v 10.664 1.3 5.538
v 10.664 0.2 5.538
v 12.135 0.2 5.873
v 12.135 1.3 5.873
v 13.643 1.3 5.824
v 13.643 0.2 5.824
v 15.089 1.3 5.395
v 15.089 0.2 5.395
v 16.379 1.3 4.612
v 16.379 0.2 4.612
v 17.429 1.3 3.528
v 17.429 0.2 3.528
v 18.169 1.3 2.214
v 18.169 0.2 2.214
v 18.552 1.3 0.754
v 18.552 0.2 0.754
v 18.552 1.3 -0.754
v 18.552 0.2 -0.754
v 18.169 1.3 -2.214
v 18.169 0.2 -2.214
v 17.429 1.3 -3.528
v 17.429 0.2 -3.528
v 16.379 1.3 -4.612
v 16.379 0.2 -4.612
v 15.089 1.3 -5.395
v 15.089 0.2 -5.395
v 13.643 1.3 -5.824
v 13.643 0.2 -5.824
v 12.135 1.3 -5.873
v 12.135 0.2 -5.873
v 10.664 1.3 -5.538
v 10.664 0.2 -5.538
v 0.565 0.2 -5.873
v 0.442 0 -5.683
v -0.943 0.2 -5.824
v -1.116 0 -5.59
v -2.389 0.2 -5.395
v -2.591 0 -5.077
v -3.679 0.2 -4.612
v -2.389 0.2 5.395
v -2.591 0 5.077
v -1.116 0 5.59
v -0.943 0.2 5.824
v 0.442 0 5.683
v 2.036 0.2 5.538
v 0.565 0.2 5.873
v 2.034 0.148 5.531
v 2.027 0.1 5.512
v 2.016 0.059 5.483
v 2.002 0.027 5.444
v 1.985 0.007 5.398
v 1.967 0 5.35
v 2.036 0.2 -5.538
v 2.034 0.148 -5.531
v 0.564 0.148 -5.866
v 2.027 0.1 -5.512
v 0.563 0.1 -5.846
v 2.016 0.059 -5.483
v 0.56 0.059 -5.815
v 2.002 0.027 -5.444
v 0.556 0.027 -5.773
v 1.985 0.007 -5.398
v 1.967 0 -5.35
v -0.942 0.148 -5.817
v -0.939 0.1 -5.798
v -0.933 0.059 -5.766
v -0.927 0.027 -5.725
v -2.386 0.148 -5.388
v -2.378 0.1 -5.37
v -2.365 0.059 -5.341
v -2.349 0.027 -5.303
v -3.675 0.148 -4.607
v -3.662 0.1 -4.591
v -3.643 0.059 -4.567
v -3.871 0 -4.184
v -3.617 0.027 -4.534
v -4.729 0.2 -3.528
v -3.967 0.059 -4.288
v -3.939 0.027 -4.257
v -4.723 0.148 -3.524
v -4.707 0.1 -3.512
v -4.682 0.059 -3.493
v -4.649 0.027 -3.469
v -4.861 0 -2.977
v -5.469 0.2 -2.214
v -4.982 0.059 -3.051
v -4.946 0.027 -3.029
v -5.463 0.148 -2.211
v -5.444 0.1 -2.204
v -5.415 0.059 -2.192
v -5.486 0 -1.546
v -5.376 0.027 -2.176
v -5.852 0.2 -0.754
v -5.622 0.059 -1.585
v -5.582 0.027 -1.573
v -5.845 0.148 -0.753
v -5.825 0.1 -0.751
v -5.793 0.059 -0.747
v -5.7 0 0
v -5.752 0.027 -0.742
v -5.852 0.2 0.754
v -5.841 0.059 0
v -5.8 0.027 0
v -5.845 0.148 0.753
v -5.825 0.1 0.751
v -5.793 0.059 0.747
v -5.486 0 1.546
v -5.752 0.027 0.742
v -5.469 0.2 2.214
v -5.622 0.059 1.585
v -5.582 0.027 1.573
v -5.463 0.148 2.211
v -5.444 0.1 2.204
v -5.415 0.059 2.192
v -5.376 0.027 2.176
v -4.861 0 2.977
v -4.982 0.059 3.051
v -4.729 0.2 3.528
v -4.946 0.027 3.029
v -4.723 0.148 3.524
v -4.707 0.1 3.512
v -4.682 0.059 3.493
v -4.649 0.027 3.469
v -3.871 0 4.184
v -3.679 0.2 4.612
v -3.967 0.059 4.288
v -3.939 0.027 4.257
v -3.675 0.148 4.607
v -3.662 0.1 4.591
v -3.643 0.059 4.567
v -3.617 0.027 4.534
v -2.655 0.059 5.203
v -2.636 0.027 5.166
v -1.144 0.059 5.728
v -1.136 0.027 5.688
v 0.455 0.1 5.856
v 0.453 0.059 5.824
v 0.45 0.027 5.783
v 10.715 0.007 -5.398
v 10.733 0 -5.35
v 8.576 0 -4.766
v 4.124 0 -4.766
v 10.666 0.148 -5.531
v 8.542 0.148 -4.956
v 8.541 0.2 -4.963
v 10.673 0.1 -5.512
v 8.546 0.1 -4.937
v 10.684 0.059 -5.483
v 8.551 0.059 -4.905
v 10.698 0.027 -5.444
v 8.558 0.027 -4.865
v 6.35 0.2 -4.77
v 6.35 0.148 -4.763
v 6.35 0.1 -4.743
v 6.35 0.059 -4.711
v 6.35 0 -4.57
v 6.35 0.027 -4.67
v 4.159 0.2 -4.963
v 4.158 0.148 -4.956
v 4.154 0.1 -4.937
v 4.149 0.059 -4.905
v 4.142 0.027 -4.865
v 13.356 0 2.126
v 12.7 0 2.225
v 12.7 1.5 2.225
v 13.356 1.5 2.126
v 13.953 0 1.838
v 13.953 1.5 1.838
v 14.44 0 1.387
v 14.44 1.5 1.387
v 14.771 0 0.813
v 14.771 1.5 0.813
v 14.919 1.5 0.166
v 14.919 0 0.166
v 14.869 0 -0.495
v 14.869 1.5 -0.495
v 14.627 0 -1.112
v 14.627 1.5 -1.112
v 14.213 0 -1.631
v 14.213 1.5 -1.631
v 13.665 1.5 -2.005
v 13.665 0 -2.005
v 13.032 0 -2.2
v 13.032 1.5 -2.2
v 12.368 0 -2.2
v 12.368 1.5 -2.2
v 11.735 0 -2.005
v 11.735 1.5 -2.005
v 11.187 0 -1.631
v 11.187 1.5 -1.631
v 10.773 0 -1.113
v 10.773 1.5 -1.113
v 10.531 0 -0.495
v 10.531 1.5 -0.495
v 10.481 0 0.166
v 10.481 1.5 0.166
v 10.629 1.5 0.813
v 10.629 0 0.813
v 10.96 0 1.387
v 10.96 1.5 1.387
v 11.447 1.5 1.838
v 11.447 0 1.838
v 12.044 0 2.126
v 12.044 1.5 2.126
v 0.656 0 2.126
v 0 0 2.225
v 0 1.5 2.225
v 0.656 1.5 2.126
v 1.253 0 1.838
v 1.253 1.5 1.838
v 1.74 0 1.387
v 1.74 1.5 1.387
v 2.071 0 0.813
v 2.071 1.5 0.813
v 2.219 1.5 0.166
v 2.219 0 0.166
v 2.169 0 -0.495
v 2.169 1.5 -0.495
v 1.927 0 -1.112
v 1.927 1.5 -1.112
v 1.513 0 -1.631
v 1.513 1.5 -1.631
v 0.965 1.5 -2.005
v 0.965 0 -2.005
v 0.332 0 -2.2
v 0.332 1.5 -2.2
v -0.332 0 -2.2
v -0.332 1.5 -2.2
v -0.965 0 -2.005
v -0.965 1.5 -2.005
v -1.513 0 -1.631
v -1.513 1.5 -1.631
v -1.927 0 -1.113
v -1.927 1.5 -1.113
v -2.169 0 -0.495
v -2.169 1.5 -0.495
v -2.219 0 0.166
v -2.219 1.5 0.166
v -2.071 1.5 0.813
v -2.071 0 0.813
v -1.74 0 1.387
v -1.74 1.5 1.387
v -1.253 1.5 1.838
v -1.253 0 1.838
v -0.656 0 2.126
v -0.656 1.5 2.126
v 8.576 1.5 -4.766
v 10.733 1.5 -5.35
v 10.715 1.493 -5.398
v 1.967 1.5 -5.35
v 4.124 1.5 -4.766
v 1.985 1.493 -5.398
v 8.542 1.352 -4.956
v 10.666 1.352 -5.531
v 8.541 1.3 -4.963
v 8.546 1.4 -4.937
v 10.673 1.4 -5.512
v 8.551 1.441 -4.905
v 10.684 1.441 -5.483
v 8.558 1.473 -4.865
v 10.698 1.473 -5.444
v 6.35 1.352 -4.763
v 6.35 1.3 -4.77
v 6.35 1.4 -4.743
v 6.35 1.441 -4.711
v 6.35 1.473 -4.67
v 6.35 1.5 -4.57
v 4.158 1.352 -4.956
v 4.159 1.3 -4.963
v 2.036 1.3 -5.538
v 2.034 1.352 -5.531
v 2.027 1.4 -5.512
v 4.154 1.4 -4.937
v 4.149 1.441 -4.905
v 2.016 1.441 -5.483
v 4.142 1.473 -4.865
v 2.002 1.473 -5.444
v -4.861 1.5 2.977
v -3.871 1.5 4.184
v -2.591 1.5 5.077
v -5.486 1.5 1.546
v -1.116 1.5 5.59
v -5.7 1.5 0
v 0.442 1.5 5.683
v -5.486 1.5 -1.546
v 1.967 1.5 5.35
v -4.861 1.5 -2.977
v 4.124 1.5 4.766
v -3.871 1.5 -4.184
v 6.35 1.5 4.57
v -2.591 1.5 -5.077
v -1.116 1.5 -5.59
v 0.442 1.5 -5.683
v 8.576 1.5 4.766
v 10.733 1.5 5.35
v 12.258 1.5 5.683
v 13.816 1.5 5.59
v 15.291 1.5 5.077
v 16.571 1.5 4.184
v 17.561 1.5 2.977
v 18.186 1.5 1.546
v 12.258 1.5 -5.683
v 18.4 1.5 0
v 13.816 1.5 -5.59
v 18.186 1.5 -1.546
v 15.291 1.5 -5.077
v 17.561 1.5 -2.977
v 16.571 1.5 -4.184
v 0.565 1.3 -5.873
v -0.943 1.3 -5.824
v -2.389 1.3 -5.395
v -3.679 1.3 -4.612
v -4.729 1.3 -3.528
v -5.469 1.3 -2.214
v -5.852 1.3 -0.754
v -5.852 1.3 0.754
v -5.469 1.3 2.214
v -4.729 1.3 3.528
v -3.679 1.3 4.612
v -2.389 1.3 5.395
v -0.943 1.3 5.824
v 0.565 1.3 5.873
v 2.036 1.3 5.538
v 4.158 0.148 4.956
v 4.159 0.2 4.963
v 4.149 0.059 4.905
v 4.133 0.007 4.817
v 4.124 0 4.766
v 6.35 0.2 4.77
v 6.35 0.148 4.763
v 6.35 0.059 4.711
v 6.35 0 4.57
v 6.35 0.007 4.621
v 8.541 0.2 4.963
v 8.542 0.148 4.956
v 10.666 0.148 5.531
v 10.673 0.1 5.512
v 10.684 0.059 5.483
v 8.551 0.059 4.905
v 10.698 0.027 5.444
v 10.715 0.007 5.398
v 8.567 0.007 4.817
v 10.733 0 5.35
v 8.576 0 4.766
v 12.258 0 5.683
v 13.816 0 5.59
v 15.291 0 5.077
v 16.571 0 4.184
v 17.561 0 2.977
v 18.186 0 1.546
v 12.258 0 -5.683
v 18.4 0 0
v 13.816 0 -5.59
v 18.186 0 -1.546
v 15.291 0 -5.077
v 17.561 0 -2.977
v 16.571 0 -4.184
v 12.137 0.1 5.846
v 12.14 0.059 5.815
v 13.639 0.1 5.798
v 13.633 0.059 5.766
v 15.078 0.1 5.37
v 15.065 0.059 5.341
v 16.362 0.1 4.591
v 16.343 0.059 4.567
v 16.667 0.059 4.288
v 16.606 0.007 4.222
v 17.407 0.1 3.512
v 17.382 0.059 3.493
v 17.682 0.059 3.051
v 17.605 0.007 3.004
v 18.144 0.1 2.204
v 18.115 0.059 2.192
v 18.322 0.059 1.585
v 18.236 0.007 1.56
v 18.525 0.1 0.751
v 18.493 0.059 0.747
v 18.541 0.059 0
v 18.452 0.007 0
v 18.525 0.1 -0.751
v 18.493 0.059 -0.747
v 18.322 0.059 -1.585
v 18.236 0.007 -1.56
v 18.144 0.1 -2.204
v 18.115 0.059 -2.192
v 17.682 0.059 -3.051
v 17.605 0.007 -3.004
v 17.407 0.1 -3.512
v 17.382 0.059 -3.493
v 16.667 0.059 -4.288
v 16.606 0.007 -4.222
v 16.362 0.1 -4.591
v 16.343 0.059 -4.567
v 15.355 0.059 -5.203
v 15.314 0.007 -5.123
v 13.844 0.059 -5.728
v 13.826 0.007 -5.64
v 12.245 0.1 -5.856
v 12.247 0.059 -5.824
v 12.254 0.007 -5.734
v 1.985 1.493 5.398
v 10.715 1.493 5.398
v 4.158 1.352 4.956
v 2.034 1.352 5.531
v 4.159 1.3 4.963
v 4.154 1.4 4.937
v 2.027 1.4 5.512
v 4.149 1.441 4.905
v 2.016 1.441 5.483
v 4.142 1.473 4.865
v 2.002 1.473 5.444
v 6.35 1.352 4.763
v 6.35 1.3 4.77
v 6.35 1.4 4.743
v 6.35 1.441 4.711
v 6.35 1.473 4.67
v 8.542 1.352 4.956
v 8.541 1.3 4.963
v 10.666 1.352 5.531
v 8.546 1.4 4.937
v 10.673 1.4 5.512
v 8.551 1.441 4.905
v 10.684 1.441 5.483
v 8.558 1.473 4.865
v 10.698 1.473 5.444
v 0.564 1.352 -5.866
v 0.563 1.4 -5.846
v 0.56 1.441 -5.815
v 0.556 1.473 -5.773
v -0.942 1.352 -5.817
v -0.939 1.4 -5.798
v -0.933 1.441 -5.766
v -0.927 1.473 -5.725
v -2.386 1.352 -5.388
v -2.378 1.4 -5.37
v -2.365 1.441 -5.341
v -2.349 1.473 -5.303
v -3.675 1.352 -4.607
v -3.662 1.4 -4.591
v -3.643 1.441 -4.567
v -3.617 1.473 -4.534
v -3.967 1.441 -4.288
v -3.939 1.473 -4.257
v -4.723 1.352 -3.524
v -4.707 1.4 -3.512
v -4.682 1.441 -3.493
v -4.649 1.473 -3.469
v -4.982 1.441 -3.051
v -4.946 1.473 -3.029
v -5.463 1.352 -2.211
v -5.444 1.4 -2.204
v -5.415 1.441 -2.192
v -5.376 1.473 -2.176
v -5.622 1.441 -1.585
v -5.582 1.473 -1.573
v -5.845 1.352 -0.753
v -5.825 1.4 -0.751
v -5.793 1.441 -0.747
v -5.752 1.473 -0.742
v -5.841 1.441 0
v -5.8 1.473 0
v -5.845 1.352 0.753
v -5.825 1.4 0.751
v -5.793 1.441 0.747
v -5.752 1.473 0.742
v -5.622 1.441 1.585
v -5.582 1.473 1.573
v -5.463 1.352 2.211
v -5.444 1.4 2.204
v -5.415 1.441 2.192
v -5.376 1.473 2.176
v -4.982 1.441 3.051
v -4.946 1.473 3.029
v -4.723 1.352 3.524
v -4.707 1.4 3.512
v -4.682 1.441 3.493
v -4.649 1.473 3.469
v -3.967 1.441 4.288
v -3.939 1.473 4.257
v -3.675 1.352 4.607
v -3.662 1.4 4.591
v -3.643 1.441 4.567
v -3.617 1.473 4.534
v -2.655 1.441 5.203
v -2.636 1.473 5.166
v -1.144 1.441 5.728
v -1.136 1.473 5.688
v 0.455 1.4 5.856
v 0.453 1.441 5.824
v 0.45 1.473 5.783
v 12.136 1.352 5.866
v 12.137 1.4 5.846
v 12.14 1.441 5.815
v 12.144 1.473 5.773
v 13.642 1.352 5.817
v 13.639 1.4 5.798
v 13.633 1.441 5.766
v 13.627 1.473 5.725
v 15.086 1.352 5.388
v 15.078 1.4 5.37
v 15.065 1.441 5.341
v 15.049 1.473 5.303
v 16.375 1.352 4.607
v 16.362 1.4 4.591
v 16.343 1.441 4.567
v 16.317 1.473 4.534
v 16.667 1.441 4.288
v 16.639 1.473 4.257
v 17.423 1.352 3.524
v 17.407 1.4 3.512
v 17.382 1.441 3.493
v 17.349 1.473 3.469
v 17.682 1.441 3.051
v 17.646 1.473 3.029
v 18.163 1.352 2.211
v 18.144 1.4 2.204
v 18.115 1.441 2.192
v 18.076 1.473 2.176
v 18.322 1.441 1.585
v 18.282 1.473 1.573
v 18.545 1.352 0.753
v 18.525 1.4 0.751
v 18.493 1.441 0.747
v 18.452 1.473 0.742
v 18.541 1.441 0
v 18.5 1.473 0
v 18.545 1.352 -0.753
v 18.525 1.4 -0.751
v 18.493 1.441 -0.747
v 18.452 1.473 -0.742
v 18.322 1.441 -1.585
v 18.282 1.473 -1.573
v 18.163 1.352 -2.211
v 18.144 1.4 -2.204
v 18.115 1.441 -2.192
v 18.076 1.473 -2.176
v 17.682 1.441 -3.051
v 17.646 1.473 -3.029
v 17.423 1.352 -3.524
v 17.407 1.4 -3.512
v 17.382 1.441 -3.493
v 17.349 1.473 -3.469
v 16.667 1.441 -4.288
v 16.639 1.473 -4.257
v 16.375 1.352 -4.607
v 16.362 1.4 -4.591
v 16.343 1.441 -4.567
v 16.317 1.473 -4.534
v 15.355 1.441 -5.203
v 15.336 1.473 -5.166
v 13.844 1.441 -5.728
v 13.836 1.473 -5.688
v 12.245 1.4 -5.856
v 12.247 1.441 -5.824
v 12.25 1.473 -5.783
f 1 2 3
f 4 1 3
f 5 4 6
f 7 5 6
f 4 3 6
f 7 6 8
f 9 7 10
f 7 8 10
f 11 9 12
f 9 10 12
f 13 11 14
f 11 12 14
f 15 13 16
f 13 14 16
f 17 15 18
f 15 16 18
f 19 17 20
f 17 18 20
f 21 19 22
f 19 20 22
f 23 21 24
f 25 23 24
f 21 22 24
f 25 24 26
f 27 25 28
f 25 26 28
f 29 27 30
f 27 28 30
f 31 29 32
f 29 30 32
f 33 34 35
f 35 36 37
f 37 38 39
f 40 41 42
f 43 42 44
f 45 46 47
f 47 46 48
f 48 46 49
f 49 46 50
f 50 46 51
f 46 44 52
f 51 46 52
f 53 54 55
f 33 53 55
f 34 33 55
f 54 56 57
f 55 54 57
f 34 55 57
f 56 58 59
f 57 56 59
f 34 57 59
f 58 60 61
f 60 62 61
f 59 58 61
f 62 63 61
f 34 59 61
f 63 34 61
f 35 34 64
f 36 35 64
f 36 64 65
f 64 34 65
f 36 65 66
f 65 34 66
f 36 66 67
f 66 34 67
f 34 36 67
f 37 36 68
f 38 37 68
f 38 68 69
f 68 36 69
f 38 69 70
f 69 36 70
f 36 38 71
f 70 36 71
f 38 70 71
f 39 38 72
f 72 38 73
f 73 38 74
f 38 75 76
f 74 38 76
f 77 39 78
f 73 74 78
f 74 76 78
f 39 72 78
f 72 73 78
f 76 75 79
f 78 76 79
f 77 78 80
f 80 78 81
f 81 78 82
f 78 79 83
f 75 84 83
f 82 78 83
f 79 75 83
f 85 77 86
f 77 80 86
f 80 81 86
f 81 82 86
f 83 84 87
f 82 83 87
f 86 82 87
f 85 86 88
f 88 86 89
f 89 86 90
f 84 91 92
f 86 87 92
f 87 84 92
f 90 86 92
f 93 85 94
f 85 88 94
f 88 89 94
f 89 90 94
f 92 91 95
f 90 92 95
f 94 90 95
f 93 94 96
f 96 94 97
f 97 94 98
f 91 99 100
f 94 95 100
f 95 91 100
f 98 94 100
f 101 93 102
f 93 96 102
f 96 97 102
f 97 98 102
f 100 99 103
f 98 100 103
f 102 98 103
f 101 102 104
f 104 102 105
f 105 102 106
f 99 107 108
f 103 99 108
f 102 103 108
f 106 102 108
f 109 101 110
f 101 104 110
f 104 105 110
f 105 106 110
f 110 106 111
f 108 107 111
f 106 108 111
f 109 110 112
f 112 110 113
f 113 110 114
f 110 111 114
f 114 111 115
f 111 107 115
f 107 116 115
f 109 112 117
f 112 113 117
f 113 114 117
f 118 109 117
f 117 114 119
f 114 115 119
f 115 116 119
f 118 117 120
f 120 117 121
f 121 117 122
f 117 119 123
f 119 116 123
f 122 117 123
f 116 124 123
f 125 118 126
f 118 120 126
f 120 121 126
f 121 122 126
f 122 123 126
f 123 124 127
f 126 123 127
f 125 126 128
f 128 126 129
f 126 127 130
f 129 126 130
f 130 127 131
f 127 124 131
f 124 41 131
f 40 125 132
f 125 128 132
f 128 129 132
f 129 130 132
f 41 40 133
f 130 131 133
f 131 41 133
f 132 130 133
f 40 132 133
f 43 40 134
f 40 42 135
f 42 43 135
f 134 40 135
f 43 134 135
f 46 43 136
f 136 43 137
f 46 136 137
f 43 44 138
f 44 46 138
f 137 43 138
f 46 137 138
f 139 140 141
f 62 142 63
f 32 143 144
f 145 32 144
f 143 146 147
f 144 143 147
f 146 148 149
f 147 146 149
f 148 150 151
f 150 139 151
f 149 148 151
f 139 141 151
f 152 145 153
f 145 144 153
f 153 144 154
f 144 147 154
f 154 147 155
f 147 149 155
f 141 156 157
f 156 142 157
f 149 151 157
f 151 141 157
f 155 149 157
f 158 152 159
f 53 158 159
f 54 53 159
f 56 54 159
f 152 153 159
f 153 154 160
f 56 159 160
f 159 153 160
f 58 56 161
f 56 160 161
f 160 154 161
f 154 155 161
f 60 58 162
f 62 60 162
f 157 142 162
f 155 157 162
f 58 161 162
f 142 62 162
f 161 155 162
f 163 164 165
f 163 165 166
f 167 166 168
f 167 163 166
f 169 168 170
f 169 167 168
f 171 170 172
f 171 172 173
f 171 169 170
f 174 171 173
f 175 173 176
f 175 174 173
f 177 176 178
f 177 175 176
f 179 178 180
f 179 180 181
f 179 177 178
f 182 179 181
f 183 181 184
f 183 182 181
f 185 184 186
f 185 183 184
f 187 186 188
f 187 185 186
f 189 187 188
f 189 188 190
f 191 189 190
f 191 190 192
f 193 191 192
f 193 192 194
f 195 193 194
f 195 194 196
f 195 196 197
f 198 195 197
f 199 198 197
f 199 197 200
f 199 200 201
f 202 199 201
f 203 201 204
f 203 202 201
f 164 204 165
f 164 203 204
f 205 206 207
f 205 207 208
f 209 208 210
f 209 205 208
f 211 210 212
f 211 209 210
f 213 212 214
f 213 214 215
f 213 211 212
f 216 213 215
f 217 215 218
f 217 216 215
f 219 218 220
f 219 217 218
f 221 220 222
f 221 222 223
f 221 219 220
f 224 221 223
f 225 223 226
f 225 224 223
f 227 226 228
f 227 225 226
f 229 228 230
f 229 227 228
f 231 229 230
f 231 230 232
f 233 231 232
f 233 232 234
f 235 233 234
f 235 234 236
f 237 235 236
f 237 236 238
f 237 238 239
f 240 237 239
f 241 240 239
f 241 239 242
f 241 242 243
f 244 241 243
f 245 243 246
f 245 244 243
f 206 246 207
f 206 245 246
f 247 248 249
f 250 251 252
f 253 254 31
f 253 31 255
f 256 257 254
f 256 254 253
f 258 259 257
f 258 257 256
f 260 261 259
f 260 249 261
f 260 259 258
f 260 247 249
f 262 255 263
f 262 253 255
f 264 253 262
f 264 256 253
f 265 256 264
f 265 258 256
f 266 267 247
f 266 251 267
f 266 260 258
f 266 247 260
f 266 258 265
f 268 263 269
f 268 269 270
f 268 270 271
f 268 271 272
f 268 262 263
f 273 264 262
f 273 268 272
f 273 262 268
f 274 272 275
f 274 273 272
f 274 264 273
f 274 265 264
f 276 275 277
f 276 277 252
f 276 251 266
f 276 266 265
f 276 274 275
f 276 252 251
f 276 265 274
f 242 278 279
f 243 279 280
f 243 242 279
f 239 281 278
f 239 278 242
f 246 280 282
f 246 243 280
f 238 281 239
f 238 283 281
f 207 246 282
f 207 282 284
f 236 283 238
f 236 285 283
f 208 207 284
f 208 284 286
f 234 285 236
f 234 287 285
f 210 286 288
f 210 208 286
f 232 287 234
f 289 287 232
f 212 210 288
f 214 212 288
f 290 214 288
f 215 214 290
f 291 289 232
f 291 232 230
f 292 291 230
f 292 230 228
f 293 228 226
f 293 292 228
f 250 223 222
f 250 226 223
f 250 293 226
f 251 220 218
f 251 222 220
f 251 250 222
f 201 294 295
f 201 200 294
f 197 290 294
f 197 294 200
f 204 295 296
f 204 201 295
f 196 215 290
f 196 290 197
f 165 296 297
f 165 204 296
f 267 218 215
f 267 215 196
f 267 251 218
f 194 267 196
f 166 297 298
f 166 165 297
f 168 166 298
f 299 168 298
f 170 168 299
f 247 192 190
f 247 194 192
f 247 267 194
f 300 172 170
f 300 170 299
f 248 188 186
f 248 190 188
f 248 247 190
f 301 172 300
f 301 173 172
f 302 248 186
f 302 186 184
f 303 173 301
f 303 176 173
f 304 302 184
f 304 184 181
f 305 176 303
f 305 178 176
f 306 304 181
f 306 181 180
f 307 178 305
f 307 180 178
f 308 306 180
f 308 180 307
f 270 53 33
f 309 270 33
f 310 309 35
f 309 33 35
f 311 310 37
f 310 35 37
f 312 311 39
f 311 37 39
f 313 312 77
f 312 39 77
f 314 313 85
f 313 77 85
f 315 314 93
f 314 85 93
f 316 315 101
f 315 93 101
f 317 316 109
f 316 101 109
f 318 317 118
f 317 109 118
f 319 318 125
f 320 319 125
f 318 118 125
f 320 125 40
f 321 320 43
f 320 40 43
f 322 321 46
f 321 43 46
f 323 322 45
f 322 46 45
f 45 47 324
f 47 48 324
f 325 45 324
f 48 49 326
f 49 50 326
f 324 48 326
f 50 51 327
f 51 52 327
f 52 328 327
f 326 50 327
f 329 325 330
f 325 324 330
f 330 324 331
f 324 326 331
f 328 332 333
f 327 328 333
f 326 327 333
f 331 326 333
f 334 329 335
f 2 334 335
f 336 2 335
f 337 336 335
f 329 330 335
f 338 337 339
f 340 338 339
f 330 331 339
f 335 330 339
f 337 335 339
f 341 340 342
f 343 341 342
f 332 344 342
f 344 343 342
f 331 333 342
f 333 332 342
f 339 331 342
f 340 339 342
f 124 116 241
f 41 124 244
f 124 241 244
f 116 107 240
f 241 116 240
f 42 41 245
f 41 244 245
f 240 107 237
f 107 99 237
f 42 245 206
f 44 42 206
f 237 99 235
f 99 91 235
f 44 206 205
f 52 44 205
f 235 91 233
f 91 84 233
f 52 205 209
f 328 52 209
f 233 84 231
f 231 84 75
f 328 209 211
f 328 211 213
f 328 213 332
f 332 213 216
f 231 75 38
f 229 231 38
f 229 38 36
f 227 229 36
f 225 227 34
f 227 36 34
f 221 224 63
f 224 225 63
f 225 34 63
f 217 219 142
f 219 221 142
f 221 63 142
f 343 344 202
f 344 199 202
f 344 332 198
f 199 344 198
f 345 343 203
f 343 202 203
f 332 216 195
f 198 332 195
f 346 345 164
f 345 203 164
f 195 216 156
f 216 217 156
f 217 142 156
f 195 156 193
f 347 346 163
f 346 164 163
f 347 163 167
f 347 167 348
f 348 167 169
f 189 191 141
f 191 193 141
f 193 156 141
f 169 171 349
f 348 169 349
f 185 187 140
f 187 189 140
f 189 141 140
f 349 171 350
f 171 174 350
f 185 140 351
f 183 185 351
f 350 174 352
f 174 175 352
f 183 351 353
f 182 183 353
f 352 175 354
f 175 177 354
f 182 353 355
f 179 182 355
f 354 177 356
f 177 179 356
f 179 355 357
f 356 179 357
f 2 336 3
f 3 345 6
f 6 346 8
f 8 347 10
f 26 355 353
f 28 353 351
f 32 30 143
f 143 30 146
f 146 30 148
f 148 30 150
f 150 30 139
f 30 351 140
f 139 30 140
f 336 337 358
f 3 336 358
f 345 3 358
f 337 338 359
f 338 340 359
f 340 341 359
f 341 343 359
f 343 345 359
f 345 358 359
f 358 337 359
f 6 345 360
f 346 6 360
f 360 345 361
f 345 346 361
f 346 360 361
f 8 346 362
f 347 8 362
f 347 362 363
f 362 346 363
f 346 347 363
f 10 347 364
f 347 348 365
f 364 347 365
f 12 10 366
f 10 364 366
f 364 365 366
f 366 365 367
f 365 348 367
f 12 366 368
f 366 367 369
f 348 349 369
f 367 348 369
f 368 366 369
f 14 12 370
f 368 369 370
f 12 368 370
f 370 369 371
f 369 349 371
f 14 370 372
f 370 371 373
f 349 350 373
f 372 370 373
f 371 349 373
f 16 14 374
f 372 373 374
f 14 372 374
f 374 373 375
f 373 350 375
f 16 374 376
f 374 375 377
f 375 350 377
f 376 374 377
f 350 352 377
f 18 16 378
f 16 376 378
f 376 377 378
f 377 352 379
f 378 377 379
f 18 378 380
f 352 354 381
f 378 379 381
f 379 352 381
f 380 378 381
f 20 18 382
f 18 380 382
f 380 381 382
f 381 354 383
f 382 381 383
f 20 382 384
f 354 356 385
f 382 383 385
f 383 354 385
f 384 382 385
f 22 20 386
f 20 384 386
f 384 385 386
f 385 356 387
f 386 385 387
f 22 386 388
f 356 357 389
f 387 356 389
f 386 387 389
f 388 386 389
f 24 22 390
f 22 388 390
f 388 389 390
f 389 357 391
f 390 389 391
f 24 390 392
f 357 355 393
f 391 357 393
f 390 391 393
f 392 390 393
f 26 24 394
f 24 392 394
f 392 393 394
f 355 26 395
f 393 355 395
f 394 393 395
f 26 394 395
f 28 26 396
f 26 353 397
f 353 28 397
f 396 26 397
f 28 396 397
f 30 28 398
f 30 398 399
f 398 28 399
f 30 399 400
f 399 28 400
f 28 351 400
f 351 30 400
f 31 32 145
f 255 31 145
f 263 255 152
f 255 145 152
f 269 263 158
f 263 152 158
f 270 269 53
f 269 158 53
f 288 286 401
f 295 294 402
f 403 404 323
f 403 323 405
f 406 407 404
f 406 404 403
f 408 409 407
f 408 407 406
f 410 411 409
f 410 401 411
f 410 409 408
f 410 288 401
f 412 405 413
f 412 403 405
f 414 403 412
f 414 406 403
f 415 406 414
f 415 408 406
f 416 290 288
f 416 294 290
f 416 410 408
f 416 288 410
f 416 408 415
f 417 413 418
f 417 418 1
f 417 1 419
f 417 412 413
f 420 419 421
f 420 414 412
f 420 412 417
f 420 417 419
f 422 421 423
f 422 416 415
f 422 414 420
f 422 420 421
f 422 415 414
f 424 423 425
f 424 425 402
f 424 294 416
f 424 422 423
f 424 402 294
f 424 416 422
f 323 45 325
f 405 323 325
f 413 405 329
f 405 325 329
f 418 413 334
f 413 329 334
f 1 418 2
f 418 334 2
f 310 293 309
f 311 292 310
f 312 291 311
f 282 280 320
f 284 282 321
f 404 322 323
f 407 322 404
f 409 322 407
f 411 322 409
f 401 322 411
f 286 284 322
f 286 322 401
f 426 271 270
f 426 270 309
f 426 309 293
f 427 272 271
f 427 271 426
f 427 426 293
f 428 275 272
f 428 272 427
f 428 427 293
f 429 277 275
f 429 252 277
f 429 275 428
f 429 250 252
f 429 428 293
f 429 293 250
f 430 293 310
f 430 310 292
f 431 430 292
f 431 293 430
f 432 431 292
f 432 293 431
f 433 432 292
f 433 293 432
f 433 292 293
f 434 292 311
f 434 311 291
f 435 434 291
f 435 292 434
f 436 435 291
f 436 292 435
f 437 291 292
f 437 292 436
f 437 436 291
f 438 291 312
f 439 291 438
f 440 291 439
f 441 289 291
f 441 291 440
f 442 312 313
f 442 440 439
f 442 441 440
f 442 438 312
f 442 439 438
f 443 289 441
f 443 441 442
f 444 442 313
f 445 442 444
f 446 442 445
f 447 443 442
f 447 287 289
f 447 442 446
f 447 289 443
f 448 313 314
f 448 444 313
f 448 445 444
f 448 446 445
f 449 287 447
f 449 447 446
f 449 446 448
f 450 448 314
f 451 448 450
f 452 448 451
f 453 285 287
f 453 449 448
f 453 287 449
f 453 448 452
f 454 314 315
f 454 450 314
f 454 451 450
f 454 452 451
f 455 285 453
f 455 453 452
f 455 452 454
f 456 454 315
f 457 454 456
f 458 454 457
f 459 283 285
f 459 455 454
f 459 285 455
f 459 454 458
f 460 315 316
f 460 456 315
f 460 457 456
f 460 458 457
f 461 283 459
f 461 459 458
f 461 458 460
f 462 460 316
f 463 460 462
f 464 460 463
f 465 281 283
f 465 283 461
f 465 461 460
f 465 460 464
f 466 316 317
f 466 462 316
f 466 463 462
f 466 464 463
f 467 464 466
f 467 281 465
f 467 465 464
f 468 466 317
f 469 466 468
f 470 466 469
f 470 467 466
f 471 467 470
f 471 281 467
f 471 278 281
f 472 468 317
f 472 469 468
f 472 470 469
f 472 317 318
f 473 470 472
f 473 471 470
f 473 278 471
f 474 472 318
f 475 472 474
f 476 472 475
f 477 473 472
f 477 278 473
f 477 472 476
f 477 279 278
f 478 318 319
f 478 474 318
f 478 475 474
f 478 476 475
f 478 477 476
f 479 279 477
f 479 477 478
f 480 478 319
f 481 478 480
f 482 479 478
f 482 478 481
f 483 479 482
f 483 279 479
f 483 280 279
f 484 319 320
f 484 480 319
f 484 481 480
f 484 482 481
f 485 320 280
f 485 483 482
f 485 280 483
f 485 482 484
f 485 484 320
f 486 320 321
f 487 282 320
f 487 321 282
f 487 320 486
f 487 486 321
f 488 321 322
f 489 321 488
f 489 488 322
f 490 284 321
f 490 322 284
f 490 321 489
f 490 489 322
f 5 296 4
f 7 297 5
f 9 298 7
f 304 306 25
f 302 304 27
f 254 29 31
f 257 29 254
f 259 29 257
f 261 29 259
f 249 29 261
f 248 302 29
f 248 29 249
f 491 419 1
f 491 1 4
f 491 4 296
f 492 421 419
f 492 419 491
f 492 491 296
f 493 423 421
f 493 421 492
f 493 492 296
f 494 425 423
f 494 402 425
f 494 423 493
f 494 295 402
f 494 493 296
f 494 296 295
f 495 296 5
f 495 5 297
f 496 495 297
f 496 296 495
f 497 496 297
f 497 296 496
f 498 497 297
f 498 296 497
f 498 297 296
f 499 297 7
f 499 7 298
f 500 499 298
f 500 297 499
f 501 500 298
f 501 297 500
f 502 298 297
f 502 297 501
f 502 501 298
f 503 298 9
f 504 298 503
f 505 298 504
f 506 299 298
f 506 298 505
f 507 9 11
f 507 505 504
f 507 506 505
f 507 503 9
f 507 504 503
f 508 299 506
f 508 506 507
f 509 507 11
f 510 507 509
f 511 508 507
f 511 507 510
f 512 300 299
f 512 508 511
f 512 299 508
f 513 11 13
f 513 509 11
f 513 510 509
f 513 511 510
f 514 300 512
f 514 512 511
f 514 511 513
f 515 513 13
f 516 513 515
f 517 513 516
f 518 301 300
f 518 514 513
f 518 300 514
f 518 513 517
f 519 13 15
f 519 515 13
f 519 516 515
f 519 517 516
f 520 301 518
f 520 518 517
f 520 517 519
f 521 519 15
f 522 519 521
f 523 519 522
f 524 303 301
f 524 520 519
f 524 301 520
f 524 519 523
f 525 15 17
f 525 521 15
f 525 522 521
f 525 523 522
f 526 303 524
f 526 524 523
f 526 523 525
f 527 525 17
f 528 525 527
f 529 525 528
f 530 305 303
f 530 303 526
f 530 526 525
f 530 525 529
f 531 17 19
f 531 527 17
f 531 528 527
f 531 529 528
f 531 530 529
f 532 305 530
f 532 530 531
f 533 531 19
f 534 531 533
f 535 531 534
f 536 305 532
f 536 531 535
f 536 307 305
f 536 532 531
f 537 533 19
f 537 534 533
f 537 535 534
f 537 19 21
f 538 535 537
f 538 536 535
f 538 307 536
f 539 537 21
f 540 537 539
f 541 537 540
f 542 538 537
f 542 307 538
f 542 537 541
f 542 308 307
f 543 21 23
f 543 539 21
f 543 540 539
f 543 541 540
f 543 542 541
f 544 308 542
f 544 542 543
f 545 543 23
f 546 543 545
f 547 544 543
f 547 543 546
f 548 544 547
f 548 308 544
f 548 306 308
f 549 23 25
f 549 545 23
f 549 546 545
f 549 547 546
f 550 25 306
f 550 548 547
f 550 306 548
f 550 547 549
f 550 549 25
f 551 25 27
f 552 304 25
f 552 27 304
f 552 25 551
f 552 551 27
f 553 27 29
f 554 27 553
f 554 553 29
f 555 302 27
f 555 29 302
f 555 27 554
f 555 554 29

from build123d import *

# Parameters (mm, degrees)
SZKIC1_R                    = 2.225
DODANIE_WYCI_GNI_CIE1_DEPTH = 1.5
ZAOKR_GLENIE1_R             = 0.2


with BuildPart() as part:
    # Szkic1 → Dodanie-wyciągnięcie1 (new body)
    with BuildSketch(Plane(origin=(0, 0, 0), x_dir=(1, 0, 0), z_dir=(0, 1, 0))):
        with BuildLine():
            ThreePointArc((2.036141304, 5.537520076), (-5.9, 0), (2.036141304, -5.537520076))
            ThreePointArc((2.036141304, -5.537520076), (6.35, -4.769554134), (10.663858696, -5.537520076))
            ThreePointArc((10.663858696, -5.537520076), (18.6, 0), (10.663858696, 5.537520076))
            ThreePointArc((10.663858696, 5.537520076), (6.35, 4.769554134), (2.036141304, 5.537520076))
        make_face()
        with Locations(Location((0, 0, 0), (0, 0, 270))):
            Circle(SZKIC1_R, mode=Mode.SUBTRACT)
        with Locations(Location((12.7, 0, 0), (0, 0, 270))):
            Circle(SZKIC1_R, mode=Mode.SUBTRACT)
    extrude(amount=DODANIE_WYCI_GNI_CIE1_DEPTH)

    # Zaokrąglenie1
    zaokr_glenie1_edges = [part.edges().sort_by_distance(p)[0] for p in [
        (6.35, 1.5, 4.769554134),
        (18.6, 1.5, 0),
        (6.35, 1.5, -4.769554134),
        (18.6, 0, 0),
        (6.35, 0, 4.769554134),
        (-5.9, 0, 0),
        (6.35, 0, -4.769554134),
        (-5.9, 1.5, 0),
    ]]
    fillet(zaokr_glenie1_edges, radius=ZAOKR_GLENIE1_R)


solid = part.part
